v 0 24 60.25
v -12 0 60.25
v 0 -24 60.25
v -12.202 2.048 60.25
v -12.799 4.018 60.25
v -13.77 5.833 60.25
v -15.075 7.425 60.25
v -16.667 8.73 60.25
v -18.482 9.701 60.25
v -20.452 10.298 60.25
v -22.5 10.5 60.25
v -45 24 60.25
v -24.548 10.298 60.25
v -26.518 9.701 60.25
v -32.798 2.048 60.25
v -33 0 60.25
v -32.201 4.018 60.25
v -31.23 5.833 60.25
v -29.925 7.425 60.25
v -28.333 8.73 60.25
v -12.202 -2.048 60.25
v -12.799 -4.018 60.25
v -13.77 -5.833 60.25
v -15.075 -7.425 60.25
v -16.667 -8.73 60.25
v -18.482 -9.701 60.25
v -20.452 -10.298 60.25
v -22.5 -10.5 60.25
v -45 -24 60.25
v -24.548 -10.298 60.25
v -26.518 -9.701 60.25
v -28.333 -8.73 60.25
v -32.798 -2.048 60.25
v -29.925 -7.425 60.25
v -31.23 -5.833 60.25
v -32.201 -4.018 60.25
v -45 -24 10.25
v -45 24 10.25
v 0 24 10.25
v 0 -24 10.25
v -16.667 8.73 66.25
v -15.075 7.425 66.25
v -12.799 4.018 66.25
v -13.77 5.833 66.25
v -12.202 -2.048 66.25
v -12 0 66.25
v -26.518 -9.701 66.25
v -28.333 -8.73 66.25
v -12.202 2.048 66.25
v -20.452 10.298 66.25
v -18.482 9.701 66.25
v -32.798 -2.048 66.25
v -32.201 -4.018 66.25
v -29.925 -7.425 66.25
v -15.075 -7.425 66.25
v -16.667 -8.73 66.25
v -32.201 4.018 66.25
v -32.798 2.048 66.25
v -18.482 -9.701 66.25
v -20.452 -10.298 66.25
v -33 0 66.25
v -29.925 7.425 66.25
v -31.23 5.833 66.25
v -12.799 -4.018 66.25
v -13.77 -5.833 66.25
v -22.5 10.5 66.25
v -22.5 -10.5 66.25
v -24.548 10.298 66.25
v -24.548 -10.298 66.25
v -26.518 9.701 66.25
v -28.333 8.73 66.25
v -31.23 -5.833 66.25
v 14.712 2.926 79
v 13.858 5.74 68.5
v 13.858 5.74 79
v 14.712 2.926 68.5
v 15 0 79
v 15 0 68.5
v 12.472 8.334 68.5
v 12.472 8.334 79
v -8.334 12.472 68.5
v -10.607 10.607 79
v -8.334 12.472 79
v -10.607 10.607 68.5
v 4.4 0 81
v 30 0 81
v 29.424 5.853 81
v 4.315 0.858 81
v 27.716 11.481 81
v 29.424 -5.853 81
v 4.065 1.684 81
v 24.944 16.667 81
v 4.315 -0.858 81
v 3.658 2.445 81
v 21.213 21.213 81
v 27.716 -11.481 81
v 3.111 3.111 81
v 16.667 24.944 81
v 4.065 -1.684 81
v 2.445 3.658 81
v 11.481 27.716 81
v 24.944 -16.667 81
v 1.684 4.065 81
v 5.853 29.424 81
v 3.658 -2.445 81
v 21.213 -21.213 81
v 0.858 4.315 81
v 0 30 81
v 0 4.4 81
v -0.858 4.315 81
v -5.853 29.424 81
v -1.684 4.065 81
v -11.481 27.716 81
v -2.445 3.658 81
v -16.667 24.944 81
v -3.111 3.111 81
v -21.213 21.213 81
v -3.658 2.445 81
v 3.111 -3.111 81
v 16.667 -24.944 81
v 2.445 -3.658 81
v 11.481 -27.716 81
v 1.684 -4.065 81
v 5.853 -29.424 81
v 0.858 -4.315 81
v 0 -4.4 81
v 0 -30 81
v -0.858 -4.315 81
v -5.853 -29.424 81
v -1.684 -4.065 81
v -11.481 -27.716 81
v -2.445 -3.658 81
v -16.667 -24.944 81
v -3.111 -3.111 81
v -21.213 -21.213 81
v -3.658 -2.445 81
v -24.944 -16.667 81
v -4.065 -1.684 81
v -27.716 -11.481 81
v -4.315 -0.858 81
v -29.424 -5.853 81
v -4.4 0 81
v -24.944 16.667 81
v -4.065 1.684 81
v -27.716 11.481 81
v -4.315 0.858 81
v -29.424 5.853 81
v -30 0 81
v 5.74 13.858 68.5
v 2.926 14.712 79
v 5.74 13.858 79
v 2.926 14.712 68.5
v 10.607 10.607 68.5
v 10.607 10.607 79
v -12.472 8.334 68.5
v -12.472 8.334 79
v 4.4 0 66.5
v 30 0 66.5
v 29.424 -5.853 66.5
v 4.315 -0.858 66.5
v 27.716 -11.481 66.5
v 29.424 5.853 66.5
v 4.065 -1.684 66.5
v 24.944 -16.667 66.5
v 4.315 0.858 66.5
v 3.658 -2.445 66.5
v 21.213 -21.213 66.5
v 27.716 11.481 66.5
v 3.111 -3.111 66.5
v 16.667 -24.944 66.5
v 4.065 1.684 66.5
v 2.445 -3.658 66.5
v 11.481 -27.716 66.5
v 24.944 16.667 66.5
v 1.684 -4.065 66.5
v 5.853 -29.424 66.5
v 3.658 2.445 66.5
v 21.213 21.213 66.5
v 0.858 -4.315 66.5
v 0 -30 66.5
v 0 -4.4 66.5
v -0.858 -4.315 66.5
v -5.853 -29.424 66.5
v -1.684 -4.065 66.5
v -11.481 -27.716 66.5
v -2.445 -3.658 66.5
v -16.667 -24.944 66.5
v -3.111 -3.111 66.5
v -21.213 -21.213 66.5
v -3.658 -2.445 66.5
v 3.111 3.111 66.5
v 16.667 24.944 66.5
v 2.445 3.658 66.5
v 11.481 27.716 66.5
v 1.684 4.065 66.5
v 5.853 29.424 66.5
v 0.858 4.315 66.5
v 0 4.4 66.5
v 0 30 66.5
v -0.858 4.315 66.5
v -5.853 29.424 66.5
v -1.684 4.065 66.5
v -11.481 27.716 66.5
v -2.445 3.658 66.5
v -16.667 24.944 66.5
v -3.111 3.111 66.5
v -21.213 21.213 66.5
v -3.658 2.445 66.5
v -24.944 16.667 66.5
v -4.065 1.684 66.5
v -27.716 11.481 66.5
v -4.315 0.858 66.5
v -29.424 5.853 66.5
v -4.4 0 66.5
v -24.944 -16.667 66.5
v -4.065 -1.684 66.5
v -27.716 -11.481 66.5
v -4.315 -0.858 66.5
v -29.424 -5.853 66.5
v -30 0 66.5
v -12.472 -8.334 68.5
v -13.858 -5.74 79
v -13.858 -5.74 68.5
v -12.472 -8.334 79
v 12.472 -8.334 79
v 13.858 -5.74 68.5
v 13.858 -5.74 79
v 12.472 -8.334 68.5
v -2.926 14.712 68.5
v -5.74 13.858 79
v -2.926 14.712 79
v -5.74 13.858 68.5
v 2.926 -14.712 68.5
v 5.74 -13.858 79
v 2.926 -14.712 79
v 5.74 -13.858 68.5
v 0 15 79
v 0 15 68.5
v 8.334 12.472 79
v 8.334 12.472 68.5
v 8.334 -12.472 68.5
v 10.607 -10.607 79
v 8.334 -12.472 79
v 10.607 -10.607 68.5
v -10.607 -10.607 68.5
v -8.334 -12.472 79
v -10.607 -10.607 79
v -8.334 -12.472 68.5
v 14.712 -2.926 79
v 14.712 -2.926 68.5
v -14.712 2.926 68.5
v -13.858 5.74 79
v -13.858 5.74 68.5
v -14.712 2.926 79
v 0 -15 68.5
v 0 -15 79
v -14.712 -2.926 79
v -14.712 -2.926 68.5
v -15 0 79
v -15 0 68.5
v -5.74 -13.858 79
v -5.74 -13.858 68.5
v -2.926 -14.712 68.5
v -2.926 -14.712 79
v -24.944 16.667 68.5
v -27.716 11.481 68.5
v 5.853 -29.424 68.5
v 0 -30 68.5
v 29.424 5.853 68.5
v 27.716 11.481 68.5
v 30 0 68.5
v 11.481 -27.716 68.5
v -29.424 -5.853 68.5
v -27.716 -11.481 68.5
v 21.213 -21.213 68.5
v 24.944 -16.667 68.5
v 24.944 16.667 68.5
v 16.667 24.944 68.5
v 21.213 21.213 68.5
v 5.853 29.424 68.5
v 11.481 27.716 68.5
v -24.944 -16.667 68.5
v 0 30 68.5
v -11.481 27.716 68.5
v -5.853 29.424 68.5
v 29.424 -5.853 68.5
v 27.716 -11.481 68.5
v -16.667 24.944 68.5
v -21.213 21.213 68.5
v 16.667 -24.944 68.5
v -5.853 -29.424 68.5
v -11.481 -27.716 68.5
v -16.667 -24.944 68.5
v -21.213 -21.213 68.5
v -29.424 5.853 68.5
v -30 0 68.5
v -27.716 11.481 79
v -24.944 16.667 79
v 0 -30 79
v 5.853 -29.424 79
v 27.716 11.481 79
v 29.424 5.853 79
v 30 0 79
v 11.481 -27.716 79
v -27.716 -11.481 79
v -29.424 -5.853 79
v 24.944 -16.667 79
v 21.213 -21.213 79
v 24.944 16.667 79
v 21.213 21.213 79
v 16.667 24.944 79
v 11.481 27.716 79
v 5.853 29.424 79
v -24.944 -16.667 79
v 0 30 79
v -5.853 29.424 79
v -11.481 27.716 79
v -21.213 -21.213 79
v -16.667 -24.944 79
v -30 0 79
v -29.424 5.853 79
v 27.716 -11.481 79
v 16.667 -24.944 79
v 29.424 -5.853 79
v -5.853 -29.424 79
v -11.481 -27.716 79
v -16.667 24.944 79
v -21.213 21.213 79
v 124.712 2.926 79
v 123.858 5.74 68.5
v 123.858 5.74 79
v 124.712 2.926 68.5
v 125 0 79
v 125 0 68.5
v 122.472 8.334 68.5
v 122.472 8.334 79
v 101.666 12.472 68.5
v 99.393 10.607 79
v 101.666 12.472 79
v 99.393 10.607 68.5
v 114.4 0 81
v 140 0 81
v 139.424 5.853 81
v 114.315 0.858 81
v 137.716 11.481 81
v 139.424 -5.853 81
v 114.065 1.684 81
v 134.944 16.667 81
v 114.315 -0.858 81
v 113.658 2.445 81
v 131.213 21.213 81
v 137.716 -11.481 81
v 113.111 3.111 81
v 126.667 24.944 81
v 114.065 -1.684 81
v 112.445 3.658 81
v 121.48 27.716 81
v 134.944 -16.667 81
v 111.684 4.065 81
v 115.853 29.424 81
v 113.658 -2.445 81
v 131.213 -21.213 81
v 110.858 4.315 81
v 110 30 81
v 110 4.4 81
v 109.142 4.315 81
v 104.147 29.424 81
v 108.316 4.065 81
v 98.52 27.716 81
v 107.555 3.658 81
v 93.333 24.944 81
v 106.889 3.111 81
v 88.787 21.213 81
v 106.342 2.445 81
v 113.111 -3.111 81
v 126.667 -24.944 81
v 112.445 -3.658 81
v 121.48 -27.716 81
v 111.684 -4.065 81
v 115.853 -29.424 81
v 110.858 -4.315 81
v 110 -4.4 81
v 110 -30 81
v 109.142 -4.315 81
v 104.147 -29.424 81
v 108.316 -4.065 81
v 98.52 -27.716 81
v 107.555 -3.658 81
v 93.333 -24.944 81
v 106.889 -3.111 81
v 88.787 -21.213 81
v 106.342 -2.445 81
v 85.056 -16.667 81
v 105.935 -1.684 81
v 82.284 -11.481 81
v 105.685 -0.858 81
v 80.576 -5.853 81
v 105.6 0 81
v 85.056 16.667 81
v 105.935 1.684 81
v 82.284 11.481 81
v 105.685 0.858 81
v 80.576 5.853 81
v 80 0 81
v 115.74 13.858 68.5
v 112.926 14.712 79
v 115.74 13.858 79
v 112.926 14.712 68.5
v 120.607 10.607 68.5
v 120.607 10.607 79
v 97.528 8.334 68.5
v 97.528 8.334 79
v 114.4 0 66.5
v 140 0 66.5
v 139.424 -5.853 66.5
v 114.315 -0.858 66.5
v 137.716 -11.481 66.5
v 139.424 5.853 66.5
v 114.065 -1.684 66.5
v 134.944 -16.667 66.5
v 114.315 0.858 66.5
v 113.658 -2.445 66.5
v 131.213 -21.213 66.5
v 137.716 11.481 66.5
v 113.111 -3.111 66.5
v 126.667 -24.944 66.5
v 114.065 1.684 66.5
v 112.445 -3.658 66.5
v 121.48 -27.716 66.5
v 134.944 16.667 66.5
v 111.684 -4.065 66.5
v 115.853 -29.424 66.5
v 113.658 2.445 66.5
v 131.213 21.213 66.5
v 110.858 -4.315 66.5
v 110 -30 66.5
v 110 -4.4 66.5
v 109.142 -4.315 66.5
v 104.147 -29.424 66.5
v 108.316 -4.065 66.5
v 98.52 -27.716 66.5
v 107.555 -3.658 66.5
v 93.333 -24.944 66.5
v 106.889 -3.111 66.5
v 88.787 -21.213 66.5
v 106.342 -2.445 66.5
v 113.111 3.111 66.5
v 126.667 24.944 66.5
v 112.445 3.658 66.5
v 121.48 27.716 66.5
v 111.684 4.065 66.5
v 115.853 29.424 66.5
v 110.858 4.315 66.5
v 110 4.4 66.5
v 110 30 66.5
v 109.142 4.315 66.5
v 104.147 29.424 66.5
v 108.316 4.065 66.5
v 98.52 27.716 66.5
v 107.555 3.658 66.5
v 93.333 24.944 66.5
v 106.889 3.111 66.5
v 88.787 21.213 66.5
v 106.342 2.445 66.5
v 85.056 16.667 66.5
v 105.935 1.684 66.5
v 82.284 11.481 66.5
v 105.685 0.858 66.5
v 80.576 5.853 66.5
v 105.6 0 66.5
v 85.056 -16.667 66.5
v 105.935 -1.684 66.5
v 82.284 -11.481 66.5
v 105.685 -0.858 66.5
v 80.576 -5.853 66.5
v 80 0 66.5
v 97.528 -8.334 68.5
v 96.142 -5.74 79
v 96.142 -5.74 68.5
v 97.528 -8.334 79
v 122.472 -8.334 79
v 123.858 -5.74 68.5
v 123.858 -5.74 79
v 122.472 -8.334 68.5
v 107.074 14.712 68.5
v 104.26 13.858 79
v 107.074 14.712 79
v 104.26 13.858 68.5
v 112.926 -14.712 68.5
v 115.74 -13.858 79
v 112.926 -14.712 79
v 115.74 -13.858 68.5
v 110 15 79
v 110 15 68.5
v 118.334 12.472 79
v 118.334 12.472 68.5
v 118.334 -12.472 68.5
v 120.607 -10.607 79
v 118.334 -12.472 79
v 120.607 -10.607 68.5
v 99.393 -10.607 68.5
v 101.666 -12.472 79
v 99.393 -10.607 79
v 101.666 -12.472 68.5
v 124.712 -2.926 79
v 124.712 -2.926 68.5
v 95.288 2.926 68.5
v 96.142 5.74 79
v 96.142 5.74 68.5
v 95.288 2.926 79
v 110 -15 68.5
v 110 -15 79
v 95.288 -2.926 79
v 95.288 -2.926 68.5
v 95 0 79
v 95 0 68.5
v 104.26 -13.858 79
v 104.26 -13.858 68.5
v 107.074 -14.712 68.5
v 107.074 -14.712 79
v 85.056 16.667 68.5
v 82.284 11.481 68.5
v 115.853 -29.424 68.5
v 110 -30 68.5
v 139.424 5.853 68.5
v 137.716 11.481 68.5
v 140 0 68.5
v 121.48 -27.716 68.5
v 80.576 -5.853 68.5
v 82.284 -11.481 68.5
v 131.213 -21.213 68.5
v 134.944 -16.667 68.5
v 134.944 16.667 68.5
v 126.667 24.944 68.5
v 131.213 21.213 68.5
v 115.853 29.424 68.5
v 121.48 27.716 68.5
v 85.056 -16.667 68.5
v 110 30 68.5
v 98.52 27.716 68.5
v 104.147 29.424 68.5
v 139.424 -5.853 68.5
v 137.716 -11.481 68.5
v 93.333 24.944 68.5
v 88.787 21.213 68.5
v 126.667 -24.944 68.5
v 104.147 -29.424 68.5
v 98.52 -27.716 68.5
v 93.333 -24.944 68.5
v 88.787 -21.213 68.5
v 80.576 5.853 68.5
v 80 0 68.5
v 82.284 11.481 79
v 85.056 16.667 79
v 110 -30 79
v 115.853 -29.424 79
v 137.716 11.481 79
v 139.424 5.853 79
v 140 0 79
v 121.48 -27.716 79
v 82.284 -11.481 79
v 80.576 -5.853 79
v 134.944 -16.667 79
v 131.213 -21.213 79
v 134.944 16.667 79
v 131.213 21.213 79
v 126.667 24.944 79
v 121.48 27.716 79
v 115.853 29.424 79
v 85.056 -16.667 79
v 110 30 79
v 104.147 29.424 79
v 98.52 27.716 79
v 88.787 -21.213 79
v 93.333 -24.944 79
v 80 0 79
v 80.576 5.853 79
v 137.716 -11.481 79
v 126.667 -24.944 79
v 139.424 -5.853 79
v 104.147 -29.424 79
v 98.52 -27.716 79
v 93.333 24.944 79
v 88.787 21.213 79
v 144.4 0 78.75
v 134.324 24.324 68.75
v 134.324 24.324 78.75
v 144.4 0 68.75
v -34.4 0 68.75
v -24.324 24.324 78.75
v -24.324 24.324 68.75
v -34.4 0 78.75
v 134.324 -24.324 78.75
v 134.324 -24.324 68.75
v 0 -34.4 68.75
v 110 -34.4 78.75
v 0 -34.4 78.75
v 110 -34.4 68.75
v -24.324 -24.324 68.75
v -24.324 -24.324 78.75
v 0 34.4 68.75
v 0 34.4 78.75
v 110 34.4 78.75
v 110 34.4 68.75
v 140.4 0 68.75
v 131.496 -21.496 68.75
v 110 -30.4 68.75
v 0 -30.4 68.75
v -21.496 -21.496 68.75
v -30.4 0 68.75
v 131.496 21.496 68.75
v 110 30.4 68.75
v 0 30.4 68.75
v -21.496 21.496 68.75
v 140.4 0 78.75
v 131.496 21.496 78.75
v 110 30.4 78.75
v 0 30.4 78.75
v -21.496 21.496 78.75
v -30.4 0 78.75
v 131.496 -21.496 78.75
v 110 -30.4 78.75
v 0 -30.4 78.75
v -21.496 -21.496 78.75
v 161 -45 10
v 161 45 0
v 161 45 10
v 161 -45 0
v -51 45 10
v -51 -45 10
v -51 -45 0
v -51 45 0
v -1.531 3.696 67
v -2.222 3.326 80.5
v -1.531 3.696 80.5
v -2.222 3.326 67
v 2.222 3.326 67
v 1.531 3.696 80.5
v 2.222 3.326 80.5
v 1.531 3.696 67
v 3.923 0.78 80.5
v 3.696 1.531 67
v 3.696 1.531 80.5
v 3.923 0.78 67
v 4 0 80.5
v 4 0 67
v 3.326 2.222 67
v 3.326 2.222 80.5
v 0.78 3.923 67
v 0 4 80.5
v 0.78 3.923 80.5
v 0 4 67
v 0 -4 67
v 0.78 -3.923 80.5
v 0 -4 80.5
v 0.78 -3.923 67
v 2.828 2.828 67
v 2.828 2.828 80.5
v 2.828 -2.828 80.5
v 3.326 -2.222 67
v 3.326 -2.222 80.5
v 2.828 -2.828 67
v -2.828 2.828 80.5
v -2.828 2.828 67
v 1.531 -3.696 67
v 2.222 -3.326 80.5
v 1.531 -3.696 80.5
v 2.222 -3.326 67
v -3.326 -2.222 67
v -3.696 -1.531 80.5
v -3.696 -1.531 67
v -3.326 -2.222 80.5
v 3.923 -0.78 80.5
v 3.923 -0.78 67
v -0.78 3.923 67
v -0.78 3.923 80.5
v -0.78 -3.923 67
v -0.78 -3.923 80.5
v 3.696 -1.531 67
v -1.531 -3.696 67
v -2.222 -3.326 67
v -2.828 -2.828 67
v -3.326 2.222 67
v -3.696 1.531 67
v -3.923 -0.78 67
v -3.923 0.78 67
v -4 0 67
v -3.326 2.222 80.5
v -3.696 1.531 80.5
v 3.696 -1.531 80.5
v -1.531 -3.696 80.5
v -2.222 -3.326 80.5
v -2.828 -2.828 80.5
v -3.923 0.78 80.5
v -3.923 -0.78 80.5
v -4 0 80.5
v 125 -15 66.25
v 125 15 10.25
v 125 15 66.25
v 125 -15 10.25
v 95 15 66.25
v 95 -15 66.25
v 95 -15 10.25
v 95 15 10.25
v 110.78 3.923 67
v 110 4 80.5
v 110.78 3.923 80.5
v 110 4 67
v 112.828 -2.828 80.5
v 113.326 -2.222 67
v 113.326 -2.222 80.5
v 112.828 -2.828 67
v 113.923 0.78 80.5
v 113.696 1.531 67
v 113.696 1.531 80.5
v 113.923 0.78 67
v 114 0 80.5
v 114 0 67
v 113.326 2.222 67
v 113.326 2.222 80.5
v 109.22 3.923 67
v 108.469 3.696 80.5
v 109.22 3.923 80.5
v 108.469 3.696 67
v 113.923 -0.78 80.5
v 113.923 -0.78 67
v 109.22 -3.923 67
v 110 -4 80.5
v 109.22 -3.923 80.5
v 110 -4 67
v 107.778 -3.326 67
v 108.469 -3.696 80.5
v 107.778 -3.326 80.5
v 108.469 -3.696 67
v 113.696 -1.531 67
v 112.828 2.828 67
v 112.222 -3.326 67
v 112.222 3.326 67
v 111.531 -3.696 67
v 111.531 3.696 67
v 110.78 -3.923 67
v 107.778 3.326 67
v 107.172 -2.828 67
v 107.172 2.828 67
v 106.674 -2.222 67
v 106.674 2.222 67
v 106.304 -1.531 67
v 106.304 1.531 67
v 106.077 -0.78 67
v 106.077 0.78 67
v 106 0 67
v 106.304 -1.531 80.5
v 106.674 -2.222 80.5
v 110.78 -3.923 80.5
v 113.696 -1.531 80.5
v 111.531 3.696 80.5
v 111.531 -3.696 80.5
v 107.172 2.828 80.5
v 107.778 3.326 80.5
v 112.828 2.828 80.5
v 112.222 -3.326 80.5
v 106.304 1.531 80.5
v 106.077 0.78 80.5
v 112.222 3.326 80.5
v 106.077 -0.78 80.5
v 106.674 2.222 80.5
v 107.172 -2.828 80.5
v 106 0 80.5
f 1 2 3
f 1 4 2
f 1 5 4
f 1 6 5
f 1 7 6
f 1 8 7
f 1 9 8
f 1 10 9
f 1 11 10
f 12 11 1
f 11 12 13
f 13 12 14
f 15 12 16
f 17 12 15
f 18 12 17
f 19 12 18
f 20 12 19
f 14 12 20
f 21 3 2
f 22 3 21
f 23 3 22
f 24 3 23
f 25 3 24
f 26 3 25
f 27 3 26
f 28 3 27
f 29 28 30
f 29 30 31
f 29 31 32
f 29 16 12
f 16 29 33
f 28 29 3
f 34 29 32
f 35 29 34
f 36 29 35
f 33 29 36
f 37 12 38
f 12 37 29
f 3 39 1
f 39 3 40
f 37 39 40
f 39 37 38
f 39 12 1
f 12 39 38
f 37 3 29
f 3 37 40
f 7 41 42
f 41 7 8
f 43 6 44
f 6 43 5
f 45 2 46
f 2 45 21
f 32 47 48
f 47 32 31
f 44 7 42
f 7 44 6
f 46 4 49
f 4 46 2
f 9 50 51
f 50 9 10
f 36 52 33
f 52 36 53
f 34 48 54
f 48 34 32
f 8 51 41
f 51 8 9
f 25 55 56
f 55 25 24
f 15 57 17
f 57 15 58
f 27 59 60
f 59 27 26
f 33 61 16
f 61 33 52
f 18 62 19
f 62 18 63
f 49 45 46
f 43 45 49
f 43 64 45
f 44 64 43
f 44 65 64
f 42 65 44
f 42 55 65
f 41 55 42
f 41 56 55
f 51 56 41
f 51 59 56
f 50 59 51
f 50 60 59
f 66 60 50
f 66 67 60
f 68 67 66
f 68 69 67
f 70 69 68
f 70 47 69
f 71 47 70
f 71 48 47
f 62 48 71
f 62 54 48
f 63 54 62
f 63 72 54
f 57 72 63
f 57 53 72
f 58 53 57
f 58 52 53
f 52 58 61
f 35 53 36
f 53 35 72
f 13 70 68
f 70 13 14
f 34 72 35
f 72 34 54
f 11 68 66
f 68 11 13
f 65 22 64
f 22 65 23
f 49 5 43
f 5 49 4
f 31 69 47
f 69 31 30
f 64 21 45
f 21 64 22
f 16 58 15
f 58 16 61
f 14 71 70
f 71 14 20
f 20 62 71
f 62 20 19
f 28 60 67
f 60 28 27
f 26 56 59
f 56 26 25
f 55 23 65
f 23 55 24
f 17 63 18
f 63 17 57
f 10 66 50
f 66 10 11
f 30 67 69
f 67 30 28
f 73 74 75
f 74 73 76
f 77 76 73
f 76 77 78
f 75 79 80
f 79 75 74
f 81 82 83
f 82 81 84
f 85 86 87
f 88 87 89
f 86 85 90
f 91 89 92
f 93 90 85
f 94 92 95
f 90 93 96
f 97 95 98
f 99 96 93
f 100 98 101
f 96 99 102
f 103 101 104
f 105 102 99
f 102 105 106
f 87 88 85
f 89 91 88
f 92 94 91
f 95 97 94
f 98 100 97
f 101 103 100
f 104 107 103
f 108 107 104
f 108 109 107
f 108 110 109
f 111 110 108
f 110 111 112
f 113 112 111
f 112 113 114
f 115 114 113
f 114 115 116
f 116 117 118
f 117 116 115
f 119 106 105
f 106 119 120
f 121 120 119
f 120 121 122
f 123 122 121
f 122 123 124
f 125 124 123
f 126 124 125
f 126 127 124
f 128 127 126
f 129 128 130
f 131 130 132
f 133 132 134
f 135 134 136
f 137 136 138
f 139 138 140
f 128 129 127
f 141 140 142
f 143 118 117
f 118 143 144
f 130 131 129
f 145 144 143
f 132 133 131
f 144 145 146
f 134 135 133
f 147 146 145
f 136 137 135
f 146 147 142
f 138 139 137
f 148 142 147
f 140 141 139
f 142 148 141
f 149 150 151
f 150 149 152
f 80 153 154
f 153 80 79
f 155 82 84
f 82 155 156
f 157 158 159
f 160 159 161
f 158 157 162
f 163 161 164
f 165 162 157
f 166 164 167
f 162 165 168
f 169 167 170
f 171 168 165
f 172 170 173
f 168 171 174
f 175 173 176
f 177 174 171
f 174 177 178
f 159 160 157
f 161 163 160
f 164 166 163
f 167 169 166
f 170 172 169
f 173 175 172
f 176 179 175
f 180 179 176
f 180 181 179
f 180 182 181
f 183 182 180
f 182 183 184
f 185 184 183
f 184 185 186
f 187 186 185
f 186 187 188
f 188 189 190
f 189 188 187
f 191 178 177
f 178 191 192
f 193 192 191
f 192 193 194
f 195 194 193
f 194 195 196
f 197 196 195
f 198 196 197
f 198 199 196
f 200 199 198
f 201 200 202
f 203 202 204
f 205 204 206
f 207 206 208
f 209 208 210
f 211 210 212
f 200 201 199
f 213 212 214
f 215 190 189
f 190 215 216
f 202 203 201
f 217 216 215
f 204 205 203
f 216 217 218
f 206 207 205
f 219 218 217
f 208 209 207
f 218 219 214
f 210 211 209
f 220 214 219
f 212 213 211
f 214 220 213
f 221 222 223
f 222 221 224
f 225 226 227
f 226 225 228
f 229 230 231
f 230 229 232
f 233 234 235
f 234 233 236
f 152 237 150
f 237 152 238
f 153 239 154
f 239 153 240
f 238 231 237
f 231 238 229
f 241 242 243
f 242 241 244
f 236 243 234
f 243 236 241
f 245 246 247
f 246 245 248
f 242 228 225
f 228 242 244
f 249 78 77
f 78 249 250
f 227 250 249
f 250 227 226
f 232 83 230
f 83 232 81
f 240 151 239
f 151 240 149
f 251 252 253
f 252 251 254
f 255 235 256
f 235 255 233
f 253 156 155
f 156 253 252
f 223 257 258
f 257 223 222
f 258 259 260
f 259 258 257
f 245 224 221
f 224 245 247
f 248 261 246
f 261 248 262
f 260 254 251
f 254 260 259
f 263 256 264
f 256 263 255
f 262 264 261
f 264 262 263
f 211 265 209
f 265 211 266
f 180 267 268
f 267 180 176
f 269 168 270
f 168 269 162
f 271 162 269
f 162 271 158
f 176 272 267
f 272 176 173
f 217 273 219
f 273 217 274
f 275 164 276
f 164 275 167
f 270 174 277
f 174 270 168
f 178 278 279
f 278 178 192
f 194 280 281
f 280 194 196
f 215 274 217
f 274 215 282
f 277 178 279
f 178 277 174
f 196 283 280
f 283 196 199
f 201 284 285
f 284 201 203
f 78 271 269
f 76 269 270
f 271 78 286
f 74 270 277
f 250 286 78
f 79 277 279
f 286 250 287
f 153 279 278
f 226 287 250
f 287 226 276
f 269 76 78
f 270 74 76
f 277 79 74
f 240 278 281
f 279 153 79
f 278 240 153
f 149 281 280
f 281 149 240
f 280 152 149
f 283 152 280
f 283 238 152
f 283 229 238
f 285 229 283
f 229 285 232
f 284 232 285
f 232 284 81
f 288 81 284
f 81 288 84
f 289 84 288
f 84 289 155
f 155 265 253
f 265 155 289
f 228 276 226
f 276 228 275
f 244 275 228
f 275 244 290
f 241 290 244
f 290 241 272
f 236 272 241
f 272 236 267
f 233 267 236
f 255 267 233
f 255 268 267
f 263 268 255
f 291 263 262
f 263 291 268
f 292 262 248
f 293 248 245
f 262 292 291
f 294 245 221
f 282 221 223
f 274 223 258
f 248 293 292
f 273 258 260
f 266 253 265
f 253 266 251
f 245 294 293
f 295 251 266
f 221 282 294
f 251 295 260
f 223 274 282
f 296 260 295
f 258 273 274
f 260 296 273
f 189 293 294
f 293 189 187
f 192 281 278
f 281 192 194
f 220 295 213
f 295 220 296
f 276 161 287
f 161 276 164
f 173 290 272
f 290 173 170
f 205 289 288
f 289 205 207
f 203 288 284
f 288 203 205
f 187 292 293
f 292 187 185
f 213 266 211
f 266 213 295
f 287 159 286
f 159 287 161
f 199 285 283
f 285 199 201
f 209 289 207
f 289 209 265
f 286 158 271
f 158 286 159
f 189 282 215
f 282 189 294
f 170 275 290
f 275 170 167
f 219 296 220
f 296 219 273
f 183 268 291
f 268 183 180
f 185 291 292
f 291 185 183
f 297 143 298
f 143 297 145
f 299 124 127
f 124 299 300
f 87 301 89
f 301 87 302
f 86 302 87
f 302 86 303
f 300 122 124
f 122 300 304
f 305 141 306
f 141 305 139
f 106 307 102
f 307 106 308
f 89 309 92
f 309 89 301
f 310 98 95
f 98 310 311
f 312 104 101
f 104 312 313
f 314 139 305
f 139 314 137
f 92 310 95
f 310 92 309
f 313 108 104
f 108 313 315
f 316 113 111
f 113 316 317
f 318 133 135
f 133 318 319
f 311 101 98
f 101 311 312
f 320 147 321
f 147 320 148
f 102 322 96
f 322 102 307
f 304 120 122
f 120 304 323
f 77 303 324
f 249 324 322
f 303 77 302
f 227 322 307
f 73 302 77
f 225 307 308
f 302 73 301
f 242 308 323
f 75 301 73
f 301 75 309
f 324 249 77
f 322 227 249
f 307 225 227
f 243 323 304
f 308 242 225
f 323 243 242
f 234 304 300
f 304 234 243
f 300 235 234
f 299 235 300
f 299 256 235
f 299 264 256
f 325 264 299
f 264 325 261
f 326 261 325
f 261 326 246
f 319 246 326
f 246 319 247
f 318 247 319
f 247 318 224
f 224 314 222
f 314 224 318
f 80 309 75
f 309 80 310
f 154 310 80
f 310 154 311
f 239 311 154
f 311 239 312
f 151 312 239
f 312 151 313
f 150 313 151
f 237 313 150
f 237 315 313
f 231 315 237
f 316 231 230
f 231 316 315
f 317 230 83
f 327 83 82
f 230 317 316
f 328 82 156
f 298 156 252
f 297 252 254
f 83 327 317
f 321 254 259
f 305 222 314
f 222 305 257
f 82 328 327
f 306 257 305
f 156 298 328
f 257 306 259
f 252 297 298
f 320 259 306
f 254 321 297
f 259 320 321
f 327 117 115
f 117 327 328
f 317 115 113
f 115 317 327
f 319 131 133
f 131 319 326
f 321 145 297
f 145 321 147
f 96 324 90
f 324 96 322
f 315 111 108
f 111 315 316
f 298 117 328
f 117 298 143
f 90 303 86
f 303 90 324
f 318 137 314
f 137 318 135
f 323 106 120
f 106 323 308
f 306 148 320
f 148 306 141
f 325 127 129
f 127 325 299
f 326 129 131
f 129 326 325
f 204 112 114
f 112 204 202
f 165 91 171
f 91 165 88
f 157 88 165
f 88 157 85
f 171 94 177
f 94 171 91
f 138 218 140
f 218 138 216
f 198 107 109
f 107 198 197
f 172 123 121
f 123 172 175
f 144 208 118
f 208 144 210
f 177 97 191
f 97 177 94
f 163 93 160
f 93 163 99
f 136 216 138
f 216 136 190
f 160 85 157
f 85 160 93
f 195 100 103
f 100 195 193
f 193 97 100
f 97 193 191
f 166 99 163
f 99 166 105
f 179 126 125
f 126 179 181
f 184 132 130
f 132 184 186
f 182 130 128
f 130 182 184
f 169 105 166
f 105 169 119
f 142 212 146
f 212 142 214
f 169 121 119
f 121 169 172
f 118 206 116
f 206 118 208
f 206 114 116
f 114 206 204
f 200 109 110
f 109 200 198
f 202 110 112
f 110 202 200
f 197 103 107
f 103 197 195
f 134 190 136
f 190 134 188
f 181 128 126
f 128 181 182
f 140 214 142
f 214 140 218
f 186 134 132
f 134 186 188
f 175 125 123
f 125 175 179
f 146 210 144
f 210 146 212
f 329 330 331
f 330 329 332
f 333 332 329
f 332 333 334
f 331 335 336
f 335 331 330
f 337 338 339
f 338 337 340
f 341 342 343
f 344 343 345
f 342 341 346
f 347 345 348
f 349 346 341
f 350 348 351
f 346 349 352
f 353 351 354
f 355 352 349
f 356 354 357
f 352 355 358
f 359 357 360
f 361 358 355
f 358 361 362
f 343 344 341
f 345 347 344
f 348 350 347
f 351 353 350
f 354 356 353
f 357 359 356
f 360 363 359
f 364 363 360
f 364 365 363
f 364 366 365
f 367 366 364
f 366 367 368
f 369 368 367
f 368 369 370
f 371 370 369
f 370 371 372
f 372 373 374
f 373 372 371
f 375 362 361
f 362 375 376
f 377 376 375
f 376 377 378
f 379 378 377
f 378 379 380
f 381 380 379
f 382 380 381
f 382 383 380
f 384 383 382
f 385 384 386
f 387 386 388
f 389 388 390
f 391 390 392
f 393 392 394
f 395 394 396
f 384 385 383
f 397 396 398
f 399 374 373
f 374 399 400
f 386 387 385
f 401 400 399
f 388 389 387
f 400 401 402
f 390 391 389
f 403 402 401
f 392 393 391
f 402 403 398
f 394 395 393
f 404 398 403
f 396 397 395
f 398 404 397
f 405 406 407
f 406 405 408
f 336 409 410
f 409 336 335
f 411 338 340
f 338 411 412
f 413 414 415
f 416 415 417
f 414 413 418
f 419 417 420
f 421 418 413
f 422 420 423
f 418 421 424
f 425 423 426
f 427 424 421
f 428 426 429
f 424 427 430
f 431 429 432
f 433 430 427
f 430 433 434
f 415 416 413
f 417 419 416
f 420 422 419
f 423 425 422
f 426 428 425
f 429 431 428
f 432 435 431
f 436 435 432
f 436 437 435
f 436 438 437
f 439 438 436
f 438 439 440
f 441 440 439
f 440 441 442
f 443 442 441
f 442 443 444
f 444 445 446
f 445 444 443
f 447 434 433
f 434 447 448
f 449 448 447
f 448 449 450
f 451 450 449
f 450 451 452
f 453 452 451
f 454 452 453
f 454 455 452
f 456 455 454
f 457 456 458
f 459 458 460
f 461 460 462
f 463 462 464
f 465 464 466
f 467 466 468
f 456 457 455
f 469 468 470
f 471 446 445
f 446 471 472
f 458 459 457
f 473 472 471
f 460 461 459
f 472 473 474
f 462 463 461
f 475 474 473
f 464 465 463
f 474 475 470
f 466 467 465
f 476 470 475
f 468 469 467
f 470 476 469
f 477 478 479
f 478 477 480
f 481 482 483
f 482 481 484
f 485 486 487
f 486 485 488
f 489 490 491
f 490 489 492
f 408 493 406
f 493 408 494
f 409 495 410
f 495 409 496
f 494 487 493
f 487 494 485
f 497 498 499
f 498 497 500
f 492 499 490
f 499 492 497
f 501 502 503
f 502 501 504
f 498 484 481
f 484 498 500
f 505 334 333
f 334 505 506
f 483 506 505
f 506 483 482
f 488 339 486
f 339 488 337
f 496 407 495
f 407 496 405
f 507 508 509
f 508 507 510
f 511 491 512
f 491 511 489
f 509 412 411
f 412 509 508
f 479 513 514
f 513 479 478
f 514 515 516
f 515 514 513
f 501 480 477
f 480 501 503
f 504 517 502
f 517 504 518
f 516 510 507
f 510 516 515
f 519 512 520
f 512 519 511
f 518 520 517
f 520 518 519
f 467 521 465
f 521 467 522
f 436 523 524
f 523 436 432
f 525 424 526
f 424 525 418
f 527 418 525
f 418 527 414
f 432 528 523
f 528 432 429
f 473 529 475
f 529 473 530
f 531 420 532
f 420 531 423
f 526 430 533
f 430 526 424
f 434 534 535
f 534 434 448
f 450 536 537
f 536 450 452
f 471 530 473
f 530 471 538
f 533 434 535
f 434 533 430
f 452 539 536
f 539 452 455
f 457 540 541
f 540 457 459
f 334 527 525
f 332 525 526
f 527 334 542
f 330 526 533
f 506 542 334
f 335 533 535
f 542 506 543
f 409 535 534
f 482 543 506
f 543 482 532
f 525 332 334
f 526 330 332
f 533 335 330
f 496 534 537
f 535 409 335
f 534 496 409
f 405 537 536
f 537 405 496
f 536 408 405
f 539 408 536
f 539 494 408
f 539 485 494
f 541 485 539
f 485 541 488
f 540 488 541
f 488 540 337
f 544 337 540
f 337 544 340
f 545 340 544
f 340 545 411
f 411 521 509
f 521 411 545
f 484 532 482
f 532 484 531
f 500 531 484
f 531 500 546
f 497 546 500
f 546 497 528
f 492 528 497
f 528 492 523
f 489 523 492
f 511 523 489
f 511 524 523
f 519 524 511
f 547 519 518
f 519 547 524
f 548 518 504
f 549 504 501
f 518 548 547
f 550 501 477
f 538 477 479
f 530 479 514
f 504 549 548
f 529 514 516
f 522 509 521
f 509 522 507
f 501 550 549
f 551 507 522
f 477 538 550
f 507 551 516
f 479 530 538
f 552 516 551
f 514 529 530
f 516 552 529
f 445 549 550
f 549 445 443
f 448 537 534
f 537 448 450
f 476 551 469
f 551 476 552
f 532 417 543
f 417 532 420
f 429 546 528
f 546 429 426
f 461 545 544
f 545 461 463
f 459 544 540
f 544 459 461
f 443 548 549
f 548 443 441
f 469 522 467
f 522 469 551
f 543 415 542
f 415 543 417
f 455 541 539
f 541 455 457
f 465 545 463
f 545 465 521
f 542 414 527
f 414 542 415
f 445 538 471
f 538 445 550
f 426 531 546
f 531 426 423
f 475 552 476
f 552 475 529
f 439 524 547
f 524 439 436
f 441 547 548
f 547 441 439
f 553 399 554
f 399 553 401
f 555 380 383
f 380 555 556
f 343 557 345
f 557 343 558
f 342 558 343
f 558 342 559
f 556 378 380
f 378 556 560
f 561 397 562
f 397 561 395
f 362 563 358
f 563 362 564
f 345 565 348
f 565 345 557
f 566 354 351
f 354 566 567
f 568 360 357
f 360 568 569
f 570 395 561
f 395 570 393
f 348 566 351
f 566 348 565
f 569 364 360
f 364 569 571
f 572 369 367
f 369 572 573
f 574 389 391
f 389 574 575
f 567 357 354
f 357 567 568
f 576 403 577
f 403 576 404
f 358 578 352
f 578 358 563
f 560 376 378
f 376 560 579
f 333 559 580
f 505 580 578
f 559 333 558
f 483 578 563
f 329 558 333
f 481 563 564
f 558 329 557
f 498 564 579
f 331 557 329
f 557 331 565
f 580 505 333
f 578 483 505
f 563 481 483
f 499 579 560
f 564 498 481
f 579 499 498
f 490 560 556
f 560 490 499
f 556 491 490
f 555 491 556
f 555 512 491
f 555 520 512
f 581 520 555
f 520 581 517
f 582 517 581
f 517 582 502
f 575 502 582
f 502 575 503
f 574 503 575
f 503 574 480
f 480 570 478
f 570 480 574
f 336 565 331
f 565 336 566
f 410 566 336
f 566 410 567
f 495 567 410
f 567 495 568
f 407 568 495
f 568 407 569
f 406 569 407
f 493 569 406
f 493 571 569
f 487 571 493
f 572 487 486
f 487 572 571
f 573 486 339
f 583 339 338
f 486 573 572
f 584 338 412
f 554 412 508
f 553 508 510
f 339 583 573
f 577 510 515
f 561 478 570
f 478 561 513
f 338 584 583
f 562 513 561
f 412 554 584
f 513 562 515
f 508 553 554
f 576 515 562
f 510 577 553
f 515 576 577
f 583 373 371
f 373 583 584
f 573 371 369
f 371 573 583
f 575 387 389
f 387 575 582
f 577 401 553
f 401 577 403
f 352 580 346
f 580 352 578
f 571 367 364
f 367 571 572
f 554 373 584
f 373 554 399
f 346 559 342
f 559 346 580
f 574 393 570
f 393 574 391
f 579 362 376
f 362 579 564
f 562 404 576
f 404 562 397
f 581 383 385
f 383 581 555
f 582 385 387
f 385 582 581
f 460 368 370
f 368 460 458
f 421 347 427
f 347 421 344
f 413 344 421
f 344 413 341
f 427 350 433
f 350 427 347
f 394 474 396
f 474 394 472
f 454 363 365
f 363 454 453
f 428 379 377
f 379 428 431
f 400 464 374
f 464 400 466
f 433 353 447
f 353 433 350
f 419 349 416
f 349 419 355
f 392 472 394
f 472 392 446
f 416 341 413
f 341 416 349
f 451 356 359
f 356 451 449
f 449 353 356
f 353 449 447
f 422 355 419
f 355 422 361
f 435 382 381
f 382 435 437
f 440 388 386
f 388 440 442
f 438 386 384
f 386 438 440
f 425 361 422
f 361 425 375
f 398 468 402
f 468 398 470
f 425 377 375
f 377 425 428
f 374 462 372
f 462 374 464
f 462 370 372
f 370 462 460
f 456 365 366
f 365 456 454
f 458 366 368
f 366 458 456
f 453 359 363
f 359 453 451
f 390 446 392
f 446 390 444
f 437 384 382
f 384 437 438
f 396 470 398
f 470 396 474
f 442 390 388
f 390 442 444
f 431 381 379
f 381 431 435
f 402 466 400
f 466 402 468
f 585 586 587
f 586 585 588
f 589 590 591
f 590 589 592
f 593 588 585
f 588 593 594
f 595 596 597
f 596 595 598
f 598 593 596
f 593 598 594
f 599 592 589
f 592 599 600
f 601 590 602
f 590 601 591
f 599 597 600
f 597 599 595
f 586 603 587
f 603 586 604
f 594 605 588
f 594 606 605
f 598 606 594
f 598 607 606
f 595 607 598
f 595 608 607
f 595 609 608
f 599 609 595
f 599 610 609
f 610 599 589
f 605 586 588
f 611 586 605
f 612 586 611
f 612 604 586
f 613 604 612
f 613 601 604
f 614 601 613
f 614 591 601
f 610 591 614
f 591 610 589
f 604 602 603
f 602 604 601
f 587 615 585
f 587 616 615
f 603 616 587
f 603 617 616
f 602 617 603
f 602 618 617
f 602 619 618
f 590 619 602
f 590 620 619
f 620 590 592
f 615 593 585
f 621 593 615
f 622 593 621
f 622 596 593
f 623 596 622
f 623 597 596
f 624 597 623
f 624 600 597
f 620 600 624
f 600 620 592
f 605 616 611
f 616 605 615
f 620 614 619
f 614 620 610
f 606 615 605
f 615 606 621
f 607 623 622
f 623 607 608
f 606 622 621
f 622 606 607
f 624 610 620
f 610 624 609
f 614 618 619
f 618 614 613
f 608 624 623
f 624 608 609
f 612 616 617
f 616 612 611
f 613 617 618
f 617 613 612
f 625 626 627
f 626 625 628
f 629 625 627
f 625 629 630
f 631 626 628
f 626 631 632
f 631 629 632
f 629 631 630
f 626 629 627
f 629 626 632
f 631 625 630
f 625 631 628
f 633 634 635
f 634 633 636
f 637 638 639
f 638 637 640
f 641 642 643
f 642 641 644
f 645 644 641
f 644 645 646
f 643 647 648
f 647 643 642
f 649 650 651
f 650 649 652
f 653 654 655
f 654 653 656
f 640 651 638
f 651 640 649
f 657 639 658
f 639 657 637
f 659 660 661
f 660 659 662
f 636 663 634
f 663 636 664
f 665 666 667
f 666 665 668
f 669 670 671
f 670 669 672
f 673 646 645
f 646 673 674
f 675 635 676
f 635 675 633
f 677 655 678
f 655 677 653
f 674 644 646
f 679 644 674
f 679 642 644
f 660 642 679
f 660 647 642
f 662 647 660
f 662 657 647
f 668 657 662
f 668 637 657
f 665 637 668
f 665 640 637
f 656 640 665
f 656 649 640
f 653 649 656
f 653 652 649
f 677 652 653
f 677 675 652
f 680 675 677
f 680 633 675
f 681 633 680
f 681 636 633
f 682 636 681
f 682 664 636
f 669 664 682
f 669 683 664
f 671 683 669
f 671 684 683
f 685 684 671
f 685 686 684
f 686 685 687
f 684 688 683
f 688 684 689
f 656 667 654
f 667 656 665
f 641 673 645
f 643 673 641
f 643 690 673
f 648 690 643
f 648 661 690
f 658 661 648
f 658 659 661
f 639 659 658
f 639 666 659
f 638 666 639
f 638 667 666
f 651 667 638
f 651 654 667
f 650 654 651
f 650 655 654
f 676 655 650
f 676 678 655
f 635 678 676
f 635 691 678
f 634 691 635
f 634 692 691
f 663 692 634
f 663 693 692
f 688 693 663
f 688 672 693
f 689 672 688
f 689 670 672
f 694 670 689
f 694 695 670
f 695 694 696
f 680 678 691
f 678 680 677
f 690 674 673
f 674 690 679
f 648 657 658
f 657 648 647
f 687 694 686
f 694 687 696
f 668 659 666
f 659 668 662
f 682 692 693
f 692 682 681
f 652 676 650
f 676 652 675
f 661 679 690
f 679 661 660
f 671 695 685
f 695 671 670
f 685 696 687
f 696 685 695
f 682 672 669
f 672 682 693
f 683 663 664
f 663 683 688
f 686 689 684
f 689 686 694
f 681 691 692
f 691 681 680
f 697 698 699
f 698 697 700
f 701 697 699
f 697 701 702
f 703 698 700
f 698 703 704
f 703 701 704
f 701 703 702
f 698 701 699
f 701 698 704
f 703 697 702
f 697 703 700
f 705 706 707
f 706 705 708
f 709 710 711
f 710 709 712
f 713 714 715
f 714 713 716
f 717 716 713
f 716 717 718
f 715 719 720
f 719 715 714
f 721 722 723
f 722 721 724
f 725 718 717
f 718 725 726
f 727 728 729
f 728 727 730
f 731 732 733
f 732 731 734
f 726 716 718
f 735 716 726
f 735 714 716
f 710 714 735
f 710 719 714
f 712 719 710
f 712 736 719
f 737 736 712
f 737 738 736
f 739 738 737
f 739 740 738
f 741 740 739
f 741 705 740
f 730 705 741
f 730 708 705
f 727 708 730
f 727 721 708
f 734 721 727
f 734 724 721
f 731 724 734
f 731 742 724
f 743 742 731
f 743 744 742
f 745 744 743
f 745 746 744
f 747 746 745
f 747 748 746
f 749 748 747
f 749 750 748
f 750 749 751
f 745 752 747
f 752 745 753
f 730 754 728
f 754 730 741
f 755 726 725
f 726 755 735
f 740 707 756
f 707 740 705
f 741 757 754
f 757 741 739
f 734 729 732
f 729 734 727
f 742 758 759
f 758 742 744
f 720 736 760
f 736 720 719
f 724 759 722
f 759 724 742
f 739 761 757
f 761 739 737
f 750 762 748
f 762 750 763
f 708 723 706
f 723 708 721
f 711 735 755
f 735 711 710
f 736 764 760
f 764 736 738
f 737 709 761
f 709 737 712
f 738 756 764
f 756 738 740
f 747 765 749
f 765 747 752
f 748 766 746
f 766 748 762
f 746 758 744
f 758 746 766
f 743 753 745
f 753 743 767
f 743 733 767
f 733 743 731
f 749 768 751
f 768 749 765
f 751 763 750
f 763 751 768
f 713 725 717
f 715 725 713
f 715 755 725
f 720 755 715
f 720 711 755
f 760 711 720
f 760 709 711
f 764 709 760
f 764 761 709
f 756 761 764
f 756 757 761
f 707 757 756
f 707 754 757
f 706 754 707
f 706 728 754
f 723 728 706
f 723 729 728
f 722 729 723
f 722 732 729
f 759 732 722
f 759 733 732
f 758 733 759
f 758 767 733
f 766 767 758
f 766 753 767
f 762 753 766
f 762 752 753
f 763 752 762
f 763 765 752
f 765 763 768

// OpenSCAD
$fn = 32;

// ------------------------------------------------------------------------
// Motor belt drive: span 110 mm, pulleys d60, belt 10 mm wide
// Every part is its own module, assembly() places every instance.
// ------------------------------------------------------------------------

// --- part 1 ---
module base_plate() {
  difference() {
    translate([-106, -45, 0]) cube([212, 90, 10]);
  }
}

// --- part 2 ---
module motor() {
  union() {
    translate([-25, -24, 0]) cube([50, 48, 45]);
    translate([28, 0, 22.5]) rotate([0, 90, 0]) cylinder(h = 6, d = 21, center = true);
  }
}

// --- part 3 ---
module drive_shaft() {
  translate([0, 0, -6.75]) cylinder(h = 13.5, d = 8);
}

// --- part 4 ---
module pulley_drive() {
  difference() {
    union() {
      cylinder(h = 14.5, d = 30);
      cylinder(h = 2, d = 60);
      translate([0, 0, 12.5]) cylinder(h = 2, d = 60);
    }
    translate([0, 0, -1]) cylinder(h = 16.5, d = 8.8);
  }
}

// --- part 5 ---
module idler_post() {
  translate([-15, -15, 0]) cube([30, 30, 56]);
}

// --- part 6 ---
module driven_shaft() {
  translate([0, 0, -6.75]) cylinder(h = 13.5, d = 8);
}

// --- part 7 ---
module pulley_driven() {
  difference() {
    union() {
      cylinder(h = 14.5, d = 30);
      cylinder(h = 2, d = 60);
      translate([0, 0, 12.5]) cylinder(h = 2, d = 60);
    }
    translate([0, 0, -1]) cylinder(h = 16.5, d = 8.8);
  }
}

// --- part 8 ---
module drive_belt() {
  difference() {
    linear_extrude(height = 10) polygon(points = concat([for (a = [90 : 45 : 270]) [34.4 * cos(a), 34.4 * sin(a)]], [for (a = [270 : 45 : 450]) [110 + 34.4 * cos(a), 34.4 * sin(a)]]));
    translate([0, 0, -1]) linear_extrude(height = 12) polygon(points = concat([for (a = [90 : 45 : 270]) [30.4 * cos(a), 30.4 * sin(a)]], [for (a = [270 : 45 : 450]) [110 + 30.4 * cos(a), 30.4 * sin(a)]]));
  }
}

// --- assembly ---
module assembly() {
  color([0.80, 0.24, 0.20]) translate([55, 0, 0]) rotate([0, 0, 0]) base_plate();
  color([0.20, 0.45, 0.75]) translate([0, 0, 35.25]) rotate([0, 270, 0]) motor();
  color([0.25, 0.62, 0.32]) translate([0, 0, 73.75]) rotate([0, 0, 0]) drive_shaft();
  color([0.92, 0.70, 0.18]) translate([0, 0, 66.5]) rotate([0, 0, 0]) pulley_drive();
  color([0.58, 0.35, 0.70]) translate([110, 0, 10.25]) rotate([0, 0, 0]) idler_post();
  color([0.16, 0.66, 0.66]) translate([110, 0, 73.75]) rotate([0, 0, 0]) driven_shaft();
  color([0.85, 0.48, 0.18]) translate([110, 0, 66.5]) rotate([0, 0, 0]) pulley_driven();
  color([0.55, 0.60, 0.65]) translate([0, 0, 68.75]) rotate([0, 0, 0]) drive_belt();
}

assembly();
